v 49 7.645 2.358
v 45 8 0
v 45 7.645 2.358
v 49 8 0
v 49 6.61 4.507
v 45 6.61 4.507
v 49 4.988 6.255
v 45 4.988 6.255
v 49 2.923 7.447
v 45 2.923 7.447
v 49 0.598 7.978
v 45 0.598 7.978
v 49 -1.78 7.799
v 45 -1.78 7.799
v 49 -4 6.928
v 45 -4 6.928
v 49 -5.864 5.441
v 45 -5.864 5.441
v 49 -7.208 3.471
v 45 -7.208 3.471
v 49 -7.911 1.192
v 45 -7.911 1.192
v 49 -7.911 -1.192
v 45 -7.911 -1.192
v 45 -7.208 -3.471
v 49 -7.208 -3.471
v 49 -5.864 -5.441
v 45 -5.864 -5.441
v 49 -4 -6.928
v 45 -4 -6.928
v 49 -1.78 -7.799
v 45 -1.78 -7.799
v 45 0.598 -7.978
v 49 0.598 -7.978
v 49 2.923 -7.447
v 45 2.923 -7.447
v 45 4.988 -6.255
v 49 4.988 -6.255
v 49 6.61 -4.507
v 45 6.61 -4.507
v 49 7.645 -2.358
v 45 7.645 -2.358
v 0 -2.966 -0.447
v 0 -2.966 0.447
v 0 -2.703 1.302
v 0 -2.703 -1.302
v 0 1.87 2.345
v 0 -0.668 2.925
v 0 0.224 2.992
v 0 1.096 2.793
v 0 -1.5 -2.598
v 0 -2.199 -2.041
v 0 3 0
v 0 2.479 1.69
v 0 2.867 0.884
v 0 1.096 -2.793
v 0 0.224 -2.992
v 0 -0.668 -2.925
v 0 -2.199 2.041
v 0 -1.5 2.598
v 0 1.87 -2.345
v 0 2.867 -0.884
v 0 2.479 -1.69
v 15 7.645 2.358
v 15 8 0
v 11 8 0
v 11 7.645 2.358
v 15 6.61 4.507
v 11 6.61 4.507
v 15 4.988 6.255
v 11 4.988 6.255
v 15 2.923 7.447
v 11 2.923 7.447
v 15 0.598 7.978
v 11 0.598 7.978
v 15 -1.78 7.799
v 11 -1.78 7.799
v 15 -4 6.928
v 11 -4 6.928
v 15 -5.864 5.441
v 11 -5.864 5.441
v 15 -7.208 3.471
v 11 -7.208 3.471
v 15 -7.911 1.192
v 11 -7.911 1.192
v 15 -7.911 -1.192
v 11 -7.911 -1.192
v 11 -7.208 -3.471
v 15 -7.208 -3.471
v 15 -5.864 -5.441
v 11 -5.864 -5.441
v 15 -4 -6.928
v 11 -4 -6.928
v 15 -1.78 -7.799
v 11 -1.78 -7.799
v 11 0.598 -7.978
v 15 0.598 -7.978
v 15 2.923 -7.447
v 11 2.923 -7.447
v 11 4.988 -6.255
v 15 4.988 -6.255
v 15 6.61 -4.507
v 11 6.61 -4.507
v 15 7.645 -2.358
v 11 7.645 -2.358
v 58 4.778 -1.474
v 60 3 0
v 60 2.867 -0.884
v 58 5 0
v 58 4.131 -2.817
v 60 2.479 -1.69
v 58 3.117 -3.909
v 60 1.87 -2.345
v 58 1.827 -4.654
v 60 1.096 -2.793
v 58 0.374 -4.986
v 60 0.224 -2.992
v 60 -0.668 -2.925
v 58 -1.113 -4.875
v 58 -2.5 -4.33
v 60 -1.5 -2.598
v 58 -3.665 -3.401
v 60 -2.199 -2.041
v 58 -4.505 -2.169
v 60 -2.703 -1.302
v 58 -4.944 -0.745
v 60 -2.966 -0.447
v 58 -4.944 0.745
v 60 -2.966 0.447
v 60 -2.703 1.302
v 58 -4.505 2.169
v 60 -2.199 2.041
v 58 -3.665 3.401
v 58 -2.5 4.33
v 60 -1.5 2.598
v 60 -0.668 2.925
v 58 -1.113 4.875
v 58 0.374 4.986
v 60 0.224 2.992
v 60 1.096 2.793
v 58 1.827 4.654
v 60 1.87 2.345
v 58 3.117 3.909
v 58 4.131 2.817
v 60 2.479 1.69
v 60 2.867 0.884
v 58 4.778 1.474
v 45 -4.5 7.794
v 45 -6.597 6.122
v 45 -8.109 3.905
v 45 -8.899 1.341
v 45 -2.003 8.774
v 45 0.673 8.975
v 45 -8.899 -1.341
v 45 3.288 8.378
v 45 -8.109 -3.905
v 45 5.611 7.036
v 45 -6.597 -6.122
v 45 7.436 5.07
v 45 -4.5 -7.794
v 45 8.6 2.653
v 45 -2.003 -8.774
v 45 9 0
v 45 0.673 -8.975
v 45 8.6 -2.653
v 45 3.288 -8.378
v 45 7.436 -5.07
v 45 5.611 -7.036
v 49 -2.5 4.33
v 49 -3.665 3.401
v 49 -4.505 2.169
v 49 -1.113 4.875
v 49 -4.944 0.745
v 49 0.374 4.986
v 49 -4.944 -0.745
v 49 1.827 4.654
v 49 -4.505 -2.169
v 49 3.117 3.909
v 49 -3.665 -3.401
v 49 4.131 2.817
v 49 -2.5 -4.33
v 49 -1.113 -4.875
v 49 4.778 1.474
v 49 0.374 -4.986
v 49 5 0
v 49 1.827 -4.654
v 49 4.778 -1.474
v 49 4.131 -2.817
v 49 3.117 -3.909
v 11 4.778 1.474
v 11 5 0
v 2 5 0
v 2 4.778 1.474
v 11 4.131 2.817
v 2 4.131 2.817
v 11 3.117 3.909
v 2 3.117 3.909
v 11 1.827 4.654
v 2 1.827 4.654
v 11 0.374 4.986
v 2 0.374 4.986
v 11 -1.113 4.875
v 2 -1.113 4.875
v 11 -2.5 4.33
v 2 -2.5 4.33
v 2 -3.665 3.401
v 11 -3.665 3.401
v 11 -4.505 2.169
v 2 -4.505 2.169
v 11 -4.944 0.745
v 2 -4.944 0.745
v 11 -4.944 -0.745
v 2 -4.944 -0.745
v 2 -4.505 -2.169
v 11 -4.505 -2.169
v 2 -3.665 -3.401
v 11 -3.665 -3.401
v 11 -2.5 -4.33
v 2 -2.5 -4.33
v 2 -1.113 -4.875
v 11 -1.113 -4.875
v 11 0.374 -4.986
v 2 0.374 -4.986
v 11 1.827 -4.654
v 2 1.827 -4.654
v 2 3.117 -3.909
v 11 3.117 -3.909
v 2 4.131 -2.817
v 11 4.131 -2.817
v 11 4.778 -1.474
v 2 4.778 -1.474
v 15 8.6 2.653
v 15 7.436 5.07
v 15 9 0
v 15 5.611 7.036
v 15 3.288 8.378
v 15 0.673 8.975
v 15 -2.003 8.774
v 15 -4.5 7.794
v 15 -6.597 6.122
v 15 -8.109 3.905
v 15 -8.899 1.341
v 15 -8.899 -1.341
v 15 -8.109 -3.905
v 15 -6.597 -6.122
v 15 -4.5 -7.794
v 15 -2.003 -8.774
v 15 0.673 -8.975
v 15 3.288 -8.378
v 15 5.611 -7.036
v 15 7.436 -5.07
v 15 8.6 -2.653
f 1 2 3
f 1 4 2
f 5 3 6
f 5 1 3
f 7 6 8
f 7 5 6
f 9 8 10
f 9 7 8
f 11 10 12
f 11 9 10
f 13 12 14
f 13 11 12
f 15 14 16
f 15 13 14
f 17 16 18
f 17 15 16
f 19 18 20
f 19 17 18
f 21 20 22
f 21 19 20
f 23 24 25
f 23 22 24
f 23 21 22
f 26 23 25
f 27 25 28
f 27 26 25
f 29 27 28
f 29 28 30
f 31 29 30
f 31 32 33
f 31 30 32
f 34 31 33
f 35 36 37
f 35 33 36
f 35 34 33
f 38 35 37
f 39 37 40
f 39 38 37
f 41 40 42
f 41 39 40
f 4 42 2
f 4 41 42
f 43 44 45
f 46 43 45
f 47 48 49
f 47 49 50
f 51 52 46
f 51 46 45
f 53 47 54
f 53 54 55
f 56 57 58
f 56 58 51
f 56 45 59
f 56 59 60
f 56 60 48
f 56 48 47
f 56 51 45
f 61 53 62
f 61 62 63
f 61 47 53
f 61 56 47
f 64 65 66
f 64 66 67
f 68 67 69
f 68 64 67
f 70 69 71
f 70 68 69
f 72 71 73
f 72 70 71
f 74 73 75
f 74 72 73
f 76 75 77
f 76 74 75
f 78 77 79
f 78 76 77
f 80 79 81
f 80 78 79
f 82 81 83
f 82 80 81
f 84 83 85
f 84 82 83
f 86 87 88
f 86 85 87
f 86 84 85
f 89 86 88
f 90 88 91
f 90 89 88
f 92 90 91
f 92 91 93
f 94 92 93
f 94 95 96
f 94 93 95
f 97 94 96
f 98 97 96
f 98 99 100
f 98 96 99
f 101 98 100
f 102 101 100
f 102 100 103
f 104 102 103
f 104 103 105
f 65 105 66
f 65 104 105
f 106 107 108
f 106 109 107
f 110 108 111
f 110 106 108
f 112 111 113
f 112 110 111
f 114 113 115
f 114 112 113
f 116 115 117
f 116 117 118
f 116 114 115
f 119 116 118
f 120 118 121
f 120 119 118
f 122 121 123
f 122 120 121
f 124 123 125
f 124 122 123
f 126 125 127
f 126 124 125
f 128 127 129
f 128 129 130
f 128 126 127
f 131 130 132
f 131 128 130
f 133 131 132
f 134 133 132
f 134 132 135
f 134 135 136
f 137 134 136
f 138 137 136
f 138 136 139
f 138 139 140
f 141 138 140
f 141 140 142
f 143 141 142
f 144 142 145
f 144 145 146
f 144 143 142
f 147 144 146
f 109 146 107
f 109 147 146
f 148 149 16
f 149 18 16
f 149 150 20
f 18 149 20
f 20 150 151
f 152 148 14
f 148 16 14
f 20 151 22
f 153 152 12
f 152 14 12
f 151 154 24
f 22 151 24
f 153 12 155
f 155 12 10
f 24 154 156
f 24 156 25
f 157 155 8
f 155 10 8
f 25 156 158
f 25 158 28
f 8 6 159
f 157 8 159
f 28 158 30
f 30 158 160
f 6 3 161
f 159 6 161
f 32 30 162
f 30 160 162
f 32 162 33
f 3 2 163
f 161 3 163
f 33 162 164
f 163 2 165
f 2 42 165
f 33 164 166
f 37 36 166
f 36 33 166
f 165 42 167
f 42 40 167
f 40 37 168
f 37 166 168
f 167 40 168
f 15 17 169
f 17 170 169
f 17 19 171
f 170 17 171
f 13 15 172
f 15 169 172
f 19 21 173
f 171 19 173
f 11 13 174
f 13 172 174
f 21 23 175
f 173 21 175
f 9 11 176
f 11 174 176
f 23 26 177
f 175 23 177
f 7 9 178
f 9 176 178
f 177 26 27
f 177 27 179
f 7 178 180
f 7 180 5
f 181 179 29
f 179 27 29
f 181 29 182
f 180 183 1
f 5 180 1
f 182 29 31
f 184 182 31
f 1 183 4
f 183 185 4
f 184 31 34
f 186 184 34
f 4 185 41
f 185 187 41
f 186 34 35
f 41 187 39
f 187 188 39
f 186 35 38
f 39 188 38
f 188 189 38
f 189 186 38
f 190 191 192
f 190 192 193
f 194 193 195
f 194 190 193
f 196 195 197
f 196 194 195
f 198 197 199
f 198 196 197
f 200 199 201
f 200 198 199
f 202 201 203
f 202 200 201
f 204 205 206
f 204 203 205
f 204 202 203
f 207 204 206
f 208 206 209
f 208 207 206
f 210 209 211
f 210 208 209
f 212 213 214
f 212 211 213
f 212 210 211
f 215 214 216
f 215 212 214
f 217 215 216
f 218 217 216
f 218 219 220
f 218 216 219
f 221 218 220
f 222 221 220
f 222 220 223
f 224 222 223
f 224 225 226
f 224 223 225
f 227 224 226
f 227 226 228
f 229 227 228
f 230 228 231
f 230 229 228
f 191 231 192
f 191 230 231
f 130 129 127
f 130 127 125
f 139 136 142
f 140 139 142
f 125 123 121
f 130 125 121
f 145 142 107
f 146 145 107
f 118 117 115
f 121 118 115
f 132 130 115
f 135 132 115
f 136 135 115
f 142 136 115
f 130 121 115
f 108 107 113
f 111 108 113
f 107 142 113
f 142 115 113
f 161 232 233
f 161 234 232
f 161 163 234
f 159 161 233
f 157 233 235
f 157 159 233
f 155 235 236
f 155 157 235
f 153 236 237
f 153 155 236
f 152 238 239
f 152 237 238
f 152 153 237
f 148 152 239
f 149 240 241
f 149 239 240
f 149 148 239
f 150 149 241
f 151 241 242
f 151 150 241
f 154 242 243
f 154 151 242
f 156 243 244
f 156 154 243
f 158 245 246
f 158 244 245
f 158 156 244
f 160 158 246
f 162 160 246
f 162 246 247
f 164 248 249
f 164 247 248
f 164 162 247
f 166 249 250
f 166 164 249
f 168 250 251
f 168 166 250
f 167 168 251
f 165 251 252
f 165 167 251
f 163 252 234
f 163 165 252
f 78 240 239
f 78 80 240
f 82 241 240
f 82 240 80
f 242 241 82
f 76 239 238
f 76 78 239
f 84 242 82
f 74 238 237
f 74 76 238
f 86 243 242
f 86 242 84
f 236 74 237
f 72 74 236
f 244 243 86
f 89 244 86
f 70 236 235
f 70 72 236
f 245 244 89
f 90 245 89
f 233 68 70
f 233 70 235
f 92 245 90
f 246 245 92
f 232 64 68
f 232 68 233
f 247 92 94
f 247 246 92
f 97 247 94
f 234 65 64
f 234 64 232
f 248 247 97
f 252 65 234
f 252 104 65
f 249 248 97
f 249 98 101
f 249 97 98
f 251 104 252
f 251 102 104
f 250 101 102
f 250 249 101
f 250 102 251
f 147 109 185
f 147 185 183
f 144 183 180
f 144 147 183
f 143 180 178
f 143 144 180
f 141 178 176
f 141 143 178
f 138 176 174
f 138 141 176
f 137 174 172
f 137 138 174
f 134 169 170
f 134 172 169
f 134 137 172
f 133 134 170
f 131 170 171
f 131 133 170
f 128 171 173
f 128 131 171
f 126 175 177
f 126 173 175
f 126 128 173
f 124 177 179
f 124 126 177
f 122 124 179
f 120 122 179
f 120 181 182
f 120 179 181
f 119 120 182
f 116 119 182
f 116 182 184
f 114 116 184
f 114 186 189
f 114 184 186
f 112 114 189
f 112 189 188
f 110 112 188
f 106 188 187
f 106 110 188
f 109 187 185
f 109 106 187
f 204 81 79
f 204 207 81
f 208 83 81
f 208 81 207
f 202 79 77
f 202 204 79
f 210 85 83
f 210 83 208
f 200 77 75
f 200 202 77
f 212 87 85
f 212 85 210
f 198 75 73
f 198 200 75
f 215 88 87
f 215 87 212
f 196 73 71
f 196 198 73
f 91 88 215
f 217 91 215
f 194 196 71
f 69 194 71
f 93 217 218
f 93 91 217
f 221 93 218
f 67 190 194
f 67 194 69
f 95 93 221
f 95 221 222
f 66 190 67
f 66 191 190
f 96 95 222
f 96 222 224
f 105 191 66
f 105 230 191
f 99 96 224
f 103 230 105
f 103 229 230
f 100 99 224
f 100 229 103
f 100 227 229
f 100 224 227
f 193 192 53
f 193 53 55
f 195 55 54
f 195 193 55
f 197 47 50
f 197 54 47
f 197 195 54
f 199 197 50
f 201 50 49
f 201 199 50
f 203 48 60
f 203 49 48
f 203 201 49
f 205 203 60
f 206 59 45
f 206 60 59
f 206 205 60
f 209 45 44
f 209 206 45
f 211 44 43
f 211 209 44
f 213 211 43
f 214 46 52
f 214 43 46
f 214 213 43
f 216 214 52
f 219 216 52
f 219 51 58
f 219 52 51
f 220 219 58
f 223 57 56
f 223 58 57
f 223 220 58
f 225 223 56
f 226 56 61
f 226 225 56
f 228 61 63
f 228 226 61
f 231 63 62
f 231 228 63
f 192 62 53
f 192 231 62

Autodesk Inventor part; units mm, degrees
ref_plane "YZ Plane" through (0, 0, 0) normal (1, 0, 0) x (0, 1, 0)
ref_plane "XZ Plane" through (0, 0, 0) normal (0, 1, 0) x (-1, 0, 0)
ref_plane "XY Plane" through (0, 0, 0) normal (0, 0, 1) x (1, 0, 0)
sketch "Náčrt1" plane through (0, 0, 0) normal (0, 0, 1) x (1, 0, 0)
  line L0 (0, 0) -> (0, 5)
  line L1 (0, 5) -> (11, 5)
  line L2 (11, 5) -> (11, 8)
  line L3 (11, 8) -> (15, 8)
  line L4 (15, 8) -> (15, 9)
  line L5 (15, 9) -> (45, 9)
  line L6 (45, 9) -> (45, 8)
  line L7 (45, 8) -> (49, 8)
  line L8 (49, 8) -> (49, 5)
  line L9 (49, 5) -> (60, 5)
  line L10 (60, 5) -> (60, 0)
  line L11 (60, 0) -> (0, 0)
  dimension "d0" = 11
  dimension "d1" = 15
  dimension "d2" = 10
  dimension "d3" = 16
  dimension "d4" = 18
  dimension "d5" = 45
revolve "Rotace1" add sketch "Náčrt1" angle 360 about axis through (60, 0, 0) along (-1, 0, 0)
chamfer "Zkosení1" distance 2 angle 45 2 edges at (0, -5, 0) (60, -5, 0)
thread "Závit1" size "M10x1.5" class "6g" standard "ANSI Metric M Profile" full length
thread "Závit2" size "M10x1.5" class "6g" standard "ANSI Metric M Profile" full length
properties part number "čep háku"
